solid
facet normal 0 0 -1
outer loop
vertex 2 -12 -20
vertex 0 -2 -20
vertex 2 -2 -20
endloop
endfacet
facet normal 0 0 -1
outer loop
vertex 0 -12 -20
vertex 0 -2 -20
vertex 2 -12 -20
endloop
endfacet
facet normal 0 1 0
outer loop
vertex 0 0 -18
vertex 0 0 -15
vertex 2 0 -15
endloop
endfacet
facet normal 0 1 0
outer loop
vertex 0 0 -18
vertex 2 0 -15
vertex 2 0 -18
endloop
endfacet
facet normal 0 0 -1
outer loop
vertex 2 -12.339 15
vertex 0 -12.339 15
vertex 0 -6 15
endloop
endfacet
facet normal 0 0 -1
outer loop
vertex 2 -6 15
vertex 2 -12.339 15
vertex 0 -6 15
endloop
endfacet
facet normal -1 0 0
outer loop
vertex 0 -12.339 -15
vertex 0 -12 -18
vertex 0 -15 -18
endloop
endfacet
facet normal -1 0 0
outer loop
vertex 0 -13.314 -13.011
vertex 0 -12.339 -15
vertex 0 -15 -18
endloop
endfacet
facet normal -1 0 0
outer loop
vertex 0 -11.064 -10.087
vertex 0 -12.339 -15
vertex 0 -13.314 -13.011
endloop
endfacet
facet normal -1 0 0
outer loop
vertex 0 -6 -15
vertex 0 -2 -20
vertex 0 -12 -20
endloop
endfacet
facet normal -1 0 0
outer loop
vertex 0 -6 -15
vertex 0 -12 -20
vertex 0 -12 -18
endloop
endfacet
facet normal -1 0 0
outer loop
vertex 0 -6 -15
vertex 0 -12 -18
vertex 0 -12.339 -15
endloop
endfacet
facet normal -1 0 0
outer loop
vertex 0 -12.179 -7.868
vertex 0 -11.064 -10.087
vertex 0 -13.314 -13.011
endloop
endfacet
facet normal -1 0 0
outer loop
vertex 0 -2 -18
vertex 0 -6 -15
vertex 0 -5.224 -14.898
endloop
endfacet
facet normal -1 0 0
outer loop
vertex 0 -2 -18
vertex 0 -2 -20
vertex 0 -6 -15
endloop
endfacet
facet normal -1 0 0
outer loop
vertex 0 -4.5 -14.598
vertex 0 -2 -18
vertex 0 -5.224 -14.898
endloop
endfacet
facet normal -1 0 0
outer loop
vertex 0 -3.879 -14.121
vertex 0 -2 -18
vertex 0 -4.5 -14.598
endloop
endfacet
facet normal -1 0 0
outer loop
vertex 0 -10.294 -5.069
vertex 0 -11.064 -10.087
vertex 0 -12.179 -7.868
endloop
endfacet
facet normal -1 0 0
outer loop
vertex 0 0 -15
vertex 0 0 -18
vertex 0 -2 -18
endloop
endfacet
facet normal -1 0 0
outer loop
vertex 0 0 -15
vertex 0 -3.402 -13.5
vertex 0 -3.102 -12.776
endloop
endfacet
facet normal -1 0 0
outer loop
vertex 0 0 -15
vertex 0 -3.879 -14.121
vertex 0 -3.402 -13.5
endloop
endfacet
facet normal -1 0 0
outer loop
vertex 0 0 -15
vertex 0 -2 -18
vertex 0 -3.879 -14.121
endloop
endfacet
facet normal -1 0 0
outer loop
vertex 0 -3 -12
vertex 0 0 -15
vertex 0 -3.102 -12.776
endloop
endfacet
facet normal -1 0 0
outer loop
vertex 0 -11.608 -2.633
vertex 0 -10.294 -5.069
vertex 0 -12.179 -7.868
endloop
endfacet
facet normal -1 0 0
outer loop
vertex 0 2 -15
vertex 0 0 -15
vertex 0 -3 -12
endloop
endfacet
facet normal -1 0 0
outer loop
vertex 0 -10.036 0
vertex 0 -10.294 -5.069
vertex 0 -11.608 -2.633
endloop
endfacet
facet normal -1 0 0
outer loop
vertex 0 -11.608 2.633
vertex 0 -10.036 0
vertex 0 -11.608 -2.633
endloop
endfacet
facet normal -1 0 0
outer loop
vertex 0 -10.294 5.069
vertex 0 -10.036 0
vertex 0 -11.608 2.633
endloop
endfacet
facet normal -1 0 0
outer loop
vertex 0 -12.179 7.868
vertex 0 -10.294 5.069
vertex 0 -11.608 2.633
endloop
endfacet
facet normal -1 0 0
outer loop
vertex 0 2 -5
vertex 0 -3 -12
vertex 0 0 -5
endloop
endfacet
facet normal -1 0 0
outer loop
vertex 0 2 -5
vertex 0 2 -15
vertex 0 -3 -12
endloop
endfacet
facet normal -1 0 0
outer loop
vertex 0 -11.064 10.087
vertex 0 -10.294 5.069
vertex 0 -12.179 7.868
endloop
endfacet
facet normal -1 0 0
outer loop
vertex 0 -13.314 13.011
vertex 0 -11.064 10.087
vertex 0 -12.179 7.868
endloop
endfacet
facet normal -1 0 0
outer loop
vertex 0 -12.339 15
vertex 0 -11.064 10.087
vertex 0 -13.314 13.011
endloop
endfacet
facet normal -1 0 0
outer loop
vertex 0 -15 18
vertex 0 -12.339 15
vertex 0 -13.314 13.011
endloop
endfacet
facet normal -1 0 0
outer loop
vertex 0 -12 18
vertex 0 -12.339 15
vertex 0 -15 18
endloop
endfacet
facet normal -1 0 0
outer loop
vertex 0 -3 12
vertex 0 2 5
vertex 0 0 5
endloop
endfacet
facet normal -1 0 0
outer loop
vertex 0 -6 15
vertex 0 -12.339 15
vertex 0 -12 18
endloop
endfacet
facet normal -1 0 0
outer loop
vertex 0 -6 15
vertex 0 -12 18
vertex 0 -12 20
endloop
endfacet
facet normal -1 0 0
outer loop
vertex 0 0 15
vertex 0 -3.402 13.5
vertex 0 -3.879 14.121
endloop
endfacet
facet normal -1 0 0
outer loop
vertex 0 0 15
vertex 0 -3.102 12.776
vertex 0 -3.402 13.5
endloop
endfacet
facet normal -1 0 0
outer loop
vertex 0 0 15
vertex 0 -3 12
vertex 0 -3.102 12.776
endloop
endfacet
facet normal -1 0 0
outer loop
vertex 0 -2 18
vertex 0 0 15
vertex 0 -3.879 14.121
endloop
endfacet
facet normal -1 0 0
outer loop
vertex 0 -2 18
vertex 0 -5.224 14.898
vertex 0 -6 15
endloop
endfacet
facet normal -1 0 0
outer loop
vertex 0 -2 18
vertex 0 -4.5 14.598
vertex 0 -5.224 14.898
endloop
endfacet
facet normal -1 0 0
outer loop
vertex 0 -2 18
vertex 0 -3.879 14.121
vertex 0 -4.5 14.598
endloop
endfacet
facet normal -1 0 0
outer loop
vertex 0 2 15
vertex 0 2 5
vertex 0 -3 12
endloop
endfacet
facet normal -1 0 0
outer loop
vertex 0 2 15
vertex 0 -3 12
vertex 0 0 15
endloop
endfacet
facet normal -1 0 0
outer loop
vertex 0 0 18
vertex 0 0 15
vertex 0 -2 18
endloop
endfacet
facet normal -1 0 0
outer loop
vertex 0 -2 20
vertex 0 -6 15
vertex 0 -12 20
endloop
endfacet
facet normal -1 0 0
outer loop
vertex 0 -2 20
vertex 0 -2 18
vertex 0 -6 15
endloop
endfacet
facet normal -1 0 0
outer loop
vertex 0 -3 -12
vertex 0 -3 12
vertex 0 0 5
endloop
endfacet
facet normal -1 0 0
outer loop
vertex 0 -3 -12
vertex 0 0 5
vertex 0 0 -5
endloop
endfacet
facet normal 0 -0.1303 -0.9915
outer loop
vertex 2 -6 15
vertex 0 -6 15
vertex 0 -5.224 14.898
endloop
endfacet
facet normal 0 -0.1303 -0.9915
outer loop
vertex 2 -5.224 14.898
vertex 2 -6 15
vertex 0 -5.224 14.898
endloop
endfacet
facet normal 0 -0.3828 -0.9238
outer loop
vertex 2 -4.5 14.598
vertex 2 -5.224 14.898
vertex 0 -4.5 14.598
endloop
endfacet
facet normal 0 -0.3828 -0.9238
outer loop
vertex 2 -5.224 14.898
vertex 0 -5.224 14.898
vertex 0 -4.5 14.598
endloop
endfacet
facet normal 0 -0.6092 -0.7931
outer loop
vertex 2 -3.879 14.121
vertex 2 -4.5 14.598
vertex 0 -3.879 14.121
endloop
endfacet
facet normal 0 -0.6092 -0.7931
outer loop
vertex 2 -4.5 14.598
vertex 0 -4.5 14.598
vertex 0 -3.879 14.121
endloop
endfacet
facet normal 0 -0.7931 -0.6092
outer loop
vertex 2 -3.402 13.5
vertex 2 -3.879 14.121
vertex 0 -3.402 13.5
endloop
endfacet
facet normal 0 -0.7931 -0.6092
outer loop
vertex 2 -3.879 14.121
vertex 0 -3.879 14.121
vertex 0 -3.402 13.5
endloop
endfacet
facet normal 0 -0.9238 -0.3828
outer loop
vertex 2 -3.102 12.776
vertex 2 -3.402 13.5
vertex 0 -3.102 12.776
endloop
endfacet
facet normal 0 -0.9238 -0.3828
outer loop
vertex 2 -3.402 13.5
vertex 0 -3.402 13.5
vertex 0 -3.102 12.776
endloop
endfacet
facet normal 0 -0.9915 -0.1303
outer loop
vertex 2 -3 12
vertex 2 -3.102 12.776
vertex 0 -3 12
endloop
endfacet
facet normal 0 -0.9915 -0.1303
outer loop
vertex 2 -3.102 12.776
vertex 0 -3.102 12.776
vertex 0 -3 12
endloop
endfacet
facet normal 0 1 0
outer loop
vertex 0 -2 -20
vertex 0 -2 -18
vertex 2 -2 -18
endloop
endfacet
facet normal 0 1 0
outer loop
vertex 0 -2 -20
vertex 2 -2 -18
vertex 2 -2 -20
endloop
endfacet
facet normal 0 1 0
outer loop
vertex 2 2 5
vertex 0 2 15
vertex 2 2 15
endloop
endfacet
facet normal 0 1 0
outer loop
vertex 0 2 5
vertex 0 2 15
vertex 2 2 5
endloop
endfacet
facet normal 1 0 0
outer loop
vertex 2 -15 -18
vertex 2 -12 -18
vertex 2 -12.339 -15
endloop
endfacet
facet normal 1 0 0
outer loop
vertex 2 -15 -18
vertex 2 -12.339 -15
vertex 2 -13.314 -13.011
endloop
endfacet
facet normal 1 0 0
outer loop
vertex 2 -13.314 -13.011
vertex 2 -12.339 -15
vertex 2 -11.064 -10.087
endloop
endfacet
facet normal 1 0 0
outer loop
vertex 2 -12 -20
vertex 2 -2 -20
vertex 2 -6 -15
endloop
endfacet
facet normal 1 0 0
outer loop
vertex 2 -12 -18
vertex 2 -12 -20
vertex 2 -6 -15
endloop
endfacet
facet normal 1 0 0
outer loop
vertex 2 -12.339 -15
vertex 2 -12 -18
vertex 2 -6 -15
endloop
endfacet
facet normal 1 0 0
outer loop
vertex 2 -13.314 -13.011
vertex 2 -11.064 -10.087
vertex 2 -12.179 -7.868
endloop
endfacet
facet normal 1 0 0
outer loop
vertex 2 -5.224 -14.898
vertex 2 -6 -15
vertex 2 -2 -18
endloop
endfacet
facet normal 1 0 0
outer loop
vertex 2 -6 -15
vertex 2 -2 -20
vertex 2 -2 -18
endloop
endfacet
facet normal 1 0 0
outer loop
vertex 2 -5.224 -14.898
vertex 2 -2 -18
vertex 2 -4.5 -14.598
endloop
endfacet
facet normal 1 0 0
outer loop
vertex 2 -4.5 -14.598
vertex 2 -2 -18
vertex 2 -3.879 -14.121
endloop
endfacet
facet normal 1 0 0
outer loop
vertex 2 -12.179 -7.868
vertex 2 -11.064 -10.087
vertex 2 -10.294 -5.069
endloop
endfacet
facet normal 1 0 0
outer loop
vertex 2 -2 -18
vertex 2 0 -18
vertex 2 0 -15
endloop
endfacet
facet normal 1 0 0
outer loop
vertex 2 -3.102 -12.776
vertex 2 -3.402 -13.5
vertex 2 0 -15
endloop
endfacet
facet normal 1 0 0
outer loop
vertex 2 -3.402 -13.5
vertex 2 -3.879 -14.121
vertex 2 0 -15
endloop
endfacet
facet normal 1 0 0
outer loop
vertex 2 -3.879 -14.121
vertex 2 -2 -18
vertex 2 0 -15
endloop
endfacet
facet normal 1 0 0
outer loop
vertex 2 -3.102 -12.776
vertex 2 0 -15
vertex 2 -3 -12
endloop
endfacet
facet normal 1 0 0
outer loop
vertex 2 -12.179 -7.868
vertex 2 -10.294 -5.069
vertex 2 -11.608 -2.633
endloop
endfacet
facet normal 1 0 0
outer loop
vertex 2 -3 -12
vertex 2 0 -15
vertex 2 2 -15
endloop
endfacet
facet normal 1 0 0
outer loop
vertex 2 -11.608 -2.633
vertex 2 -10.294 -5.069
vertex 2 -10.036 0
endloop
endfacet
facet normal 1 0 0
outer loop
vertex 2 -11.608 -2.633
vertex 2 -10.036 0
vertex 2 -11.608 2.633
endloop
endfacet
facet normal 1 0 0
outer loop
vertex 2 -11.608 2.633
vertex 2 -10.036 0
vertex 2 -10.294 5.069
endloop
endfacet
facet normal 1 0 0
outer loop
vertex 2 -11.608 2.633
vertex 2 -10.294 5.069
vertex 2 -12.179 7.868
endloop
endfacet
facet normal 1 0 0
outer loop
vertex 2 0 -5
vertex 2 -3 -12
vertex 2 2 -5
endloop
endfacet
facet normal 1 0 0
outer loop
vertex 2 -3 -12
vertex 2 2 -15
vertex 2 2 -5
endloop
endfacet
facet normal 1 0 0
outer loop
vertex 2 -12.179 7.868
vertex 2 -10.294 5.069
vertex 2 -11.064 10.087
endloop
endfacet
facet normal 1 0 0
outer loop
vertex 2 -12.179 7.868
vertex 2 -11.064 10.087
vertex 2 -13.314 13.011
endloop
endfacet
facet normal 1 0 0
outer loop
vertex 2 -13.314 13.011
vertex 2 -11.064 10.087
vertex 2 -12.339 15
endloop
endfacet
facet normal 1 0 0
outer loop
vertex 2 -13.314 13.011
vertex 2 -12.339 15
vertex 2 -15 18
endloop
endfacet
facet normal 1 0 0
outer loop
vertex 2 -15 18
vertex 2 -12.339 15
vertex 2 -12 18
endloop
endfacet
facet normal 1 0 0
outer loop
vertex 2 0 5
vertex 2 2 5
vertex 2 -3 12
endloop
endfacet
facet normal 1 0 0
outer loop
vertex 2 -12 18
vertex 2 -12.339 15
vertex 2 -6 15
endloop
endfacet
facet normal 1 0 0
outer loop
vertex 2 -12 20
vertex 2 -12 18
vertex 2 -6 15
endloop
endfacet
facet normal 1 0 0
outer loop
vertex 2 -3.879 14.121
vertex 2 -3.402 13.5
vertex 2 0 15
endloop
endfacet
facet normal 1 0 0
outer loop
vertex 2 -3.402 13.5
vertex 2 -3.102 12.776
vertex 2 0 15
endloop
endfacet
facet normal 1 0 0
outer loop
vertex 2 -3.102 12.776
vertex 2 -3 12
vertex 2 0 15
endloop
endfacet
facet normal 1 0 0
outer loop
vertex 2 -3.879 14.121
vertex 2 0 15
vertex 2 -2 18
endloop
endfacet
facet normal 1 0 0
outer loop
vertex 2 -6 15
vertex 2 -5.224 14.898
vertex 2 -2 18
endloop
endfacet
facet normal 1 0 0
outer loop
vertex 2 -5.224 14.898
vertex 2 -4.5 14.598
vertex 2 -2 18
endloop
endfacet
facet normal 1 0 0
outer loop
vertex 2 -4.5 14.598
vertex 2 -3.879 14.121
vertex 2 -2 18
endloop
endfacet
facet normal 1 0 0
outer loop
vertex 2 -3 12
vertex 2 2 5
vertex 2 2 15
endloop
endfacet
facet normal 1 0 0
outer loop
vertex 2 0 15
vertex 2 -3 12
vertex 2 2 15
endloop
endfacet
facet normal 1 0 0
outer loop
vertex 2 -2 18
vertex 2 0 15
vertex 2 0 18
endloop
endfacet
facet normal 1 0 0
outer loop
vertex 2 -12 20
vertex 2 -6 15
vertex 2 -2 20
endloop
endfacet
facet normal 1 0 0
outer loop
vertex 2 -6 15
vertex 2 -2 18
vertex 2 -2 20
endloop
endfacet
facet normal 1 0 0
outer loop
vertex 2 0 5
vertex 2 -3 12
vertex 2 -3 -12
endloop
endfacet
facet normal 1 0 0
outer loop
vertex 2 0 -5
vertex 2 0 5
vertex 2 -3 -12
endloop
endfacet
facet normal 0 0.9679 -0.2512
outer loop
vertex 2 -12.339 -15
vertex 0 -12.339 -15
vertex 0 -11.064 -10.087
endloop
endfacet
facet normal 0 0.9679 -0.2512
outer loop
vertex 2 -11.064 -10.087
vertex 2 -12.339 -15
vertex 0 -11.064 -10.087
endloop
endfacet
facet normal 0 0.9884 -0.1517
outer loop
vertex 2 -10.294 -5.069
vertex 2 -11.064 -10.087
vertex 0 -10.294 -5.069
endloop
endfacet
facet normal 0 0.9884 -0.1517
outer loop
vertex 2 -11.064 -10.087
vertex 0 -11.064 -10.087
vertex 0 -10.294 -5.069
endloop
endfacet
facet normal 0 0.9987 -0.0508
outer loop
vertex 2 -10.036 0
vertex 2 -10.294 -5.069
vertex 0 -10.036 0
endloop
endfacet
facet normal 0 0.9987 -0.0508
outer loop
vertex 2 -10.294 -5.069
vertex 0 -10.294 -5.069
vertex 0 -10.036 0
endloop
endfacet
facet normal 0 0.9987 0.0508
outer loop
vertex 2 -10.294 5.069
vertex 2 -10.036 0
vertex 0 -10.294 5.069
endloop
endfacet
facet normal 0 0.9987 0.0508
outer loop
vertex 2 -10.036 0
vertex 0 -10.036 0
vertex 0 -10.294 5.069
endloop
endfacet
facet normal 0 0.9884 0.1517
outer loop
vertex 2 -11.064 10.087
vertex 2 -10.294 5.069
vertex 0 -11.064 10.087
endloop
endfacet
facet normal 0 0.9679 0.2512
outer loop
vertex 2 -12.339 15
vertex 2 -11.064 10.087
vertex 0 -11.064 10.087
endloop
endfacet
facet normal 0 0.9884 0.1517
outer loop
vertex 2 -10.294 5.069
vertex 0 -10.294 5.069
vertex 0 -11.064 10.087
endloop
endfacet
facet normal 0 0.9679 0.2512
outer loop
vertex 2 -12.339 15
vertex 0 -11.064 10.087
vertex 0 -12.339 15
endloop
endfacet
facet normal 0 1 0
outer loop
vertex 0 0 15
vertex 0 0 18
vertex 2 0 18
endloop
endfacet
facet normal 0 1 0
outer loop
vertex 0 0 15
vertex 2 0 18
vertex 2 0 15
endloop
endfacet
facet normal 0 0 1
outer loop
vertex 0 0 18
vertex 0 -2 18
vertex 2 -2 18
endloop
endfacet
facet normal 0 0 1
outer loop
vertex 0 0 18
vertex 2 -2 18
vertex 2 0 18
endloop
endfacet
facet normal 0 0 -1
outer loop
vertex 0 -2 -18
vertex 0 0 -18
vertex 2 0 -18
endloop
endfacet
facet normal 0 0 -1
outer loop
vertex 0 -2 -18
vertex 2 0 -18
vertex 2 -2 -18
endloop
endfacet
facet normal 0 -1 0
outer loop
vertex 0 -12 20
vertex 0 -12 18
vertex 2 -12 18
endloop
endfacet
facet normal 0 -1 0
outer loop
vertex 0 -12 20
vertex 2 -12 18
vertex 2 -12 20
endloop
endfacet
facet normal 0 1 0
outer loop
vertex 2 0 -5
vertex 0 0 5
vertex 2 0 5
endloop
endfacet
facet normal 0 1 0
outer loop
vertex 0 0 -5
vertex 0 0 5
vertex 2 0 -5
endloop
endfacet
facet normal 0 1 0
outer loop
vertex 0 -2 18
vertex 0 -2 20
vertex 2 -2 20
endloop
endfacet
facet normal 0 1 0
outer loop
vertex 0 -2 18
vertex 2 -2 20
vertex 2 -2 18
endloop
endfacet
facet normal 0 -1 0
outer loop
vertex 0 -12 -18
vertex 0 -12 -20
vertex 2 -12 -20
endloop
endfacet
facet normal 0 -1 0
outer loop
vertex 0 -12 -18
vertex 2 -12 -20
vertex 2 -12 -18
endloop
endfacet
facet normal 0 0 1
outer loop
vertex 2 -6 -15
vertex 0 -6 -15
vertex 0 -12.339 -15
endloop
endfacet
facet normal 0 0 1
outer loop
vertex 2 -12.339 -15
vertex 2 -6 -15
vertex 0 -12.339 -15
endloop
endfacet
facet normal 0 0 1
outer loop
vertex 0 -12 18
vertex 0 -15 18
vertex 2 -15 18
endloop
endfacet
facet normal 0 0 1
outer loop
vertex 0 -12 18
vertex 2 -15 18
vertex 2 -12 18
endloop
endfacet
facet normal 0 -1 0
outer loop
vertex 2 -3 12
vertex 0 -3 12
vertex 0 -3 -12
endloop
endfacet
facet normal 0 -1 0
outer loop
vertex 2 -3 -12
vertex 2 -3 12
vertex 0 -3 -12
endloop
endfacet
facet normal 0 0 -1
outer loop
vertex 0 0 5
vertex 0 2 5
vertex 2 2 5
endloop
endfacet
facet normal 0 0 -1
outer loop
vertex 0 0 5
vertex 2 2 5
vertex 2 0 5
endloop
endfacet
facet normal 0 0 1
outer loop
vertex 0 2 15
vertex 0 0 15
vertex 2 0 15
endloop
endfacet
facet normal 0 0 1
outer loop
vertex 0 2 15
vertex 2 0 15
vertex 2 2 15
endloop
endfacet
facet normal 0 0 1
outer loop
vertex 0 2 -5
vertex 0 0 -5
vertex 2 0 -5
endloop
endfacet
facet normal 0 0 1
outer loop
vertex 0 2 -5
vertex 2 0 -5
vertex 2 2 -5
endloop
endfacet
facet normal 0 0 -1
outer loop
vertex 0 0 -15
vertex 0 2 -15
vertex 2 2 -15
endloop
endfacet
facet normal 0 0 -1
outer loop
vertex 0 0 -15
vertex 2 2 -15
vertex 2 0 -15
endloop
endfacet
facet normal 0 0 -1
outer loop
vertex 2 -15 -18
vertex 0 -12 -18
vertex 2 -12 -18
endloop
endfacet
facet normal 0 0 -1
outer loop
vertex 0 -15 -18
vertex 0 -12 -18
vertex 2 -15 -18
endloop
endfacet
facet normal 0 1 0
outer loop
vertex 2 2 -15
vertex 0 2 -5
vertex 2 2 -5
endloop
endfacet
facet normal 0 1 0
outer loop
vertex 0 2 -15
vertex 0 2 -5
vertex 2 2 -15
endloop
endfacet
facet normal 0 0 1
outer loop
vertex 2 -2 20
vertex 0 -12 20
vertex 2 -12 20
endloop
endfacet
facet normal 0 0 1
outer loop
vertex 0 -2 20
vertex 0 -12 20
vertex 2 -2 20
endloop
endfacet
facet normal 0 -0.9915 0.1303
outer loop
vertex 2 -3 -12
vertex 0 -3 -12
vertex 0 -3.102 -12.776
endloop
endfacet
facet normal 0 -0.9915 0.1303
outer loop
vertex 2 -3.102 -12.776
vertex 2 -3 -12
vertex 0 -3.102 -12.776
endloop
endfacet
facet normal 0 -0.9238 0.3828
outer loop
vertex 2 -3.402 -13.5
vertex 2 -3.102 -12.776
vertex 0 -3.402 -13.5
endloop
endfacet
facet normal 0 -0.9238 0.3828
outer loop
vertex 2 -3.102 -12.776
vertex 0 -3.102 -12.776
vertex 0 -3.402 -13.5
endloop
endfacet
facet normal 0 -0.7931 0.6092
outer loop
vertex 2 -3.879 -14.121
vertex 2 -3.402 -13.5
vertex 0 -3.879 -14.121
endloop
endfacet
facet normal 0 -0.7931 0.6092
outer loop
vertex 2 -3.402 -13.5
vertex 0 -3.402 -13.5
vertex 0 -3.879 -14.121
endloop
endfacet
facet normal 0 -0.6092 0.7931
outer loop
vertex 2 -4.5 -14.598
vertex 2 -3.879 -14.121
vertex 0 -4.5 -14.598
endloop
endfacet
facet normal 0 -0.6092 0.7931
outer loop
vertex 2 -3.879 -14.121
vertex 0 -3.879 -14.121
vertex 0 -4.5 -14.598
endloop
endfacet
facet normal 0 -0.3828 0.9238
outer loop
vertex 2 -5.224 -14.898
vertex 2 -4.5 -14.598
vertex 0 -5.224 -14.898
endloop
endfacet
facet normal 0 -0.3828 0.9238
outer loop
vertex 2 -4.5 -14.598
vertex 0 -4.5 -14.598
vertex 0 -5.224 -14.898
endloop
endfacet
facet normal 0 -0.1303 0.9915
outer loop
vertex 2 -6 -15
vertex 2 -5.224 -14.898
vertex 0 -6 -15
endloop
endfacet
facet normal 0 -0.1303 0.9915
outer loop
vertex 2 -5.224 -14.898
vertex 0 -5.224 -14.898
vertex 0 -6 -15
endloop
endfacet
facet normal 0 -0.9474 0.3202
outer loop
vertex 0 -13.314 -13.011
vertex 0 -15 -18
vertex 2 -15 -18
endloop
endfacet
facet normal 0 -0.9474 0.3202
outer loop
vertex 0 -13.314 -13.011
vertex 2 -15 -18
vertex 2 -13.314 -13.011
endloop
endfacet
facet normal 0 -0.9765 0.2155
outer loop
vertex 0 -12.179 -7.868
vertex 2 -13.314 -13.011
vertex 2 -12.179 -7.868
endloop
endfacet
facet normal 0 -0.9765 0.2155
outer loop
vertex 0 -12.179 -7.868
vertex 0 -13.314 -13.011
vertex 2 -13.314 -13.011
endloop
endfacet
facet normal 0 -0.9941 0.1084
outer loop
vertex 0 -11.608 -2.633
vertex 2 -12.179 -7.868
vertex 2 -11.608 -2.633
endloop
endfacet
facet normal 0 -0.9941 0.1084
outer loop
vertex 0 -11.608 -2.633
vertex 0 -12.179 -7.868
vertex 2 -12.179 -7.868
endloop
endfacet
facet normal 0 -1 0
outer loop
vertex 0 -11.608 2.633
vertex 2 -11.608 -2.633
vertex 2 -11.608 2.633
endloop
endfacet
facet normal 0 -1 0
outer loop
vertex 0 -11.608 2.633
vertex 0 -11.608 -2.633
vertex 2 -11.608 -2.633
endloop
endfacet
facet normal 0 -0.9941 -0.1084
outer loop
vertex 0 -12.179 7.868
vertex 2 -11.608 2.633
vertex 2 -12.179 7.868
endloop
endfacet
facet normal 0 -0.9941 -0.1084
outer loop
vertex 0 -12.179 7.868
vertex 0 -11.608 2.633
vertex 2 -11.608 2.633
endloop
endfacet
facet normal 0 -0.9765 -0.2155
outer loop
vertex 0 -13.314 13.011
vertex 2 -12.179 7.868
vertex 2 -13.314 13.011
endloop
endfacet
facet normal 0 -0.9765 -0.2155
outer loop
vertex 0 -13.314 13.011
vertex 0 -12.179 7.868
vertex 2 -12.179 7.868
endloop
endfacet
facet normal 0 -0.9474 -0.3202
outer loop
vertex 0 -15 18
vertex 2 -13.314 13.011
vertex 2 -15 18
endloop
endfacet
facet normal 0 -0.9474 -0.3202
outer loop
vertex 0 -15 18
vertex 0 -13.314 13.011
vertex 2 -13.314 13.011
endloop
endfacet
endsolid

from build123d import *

# Parameters (mm, degrees)
BOSS_EXTRUDE1_DEPTH = 2


with BuildPart() as part:
    # Sketch1 → Boss-Extrude1 (new body)
    with BuildSketch(Plane(origin=(0, 0, 0), x_dir=(0, 0, -1), z_dir=(1, 0, 0))):
        with BuildLine():
            Line((-18, 0), (-15, 0))
            Line((-15, 0), (-15, 2))
            Line((-15, 2), (-5, 2))
            Line((-5, 2), (-5, 0))
            Line((-5, 0), (5, 0))
            Line((5, 0), (5, 2))
            Line((5, 2), (15, 2))
            Line((15, 2), (15, 0))
            Line((15, 0), (18, 0))
            Line((18, 0), (18, -2))
            Line((18, -2), (20, -2))
            Line((20, -2), (20, -12))
            Line((20, -12), (18, -12))
            Line((18, -12), (18, -15))
            ThreePointArc((18, -15), (0, -11.536096634), (-18, -15))
            Line((-18, -15), (-18, -12))
            Line((-18, -12), (-20, -12))
            Line((-20, -12), (-20, -2))
            Line((-20, -2), (-18, -2))
            Line((-18, -2), (-18, 0))
        make_face()
        with BuildLine():
            Line((-15, -12.339136563), (-15, -6))
            ThreePointArc((-15, -6), (-14.121320344, -3.878679656), (-12, -3))
            Line((-12, -3), (12, -3))
            ThreePointArc((12, -3), (14.121320344, -3.878679656), (15, -6))
            Line((15, -6), (15, -12.339136563))
            ThreePointArc((15, -12.339136563), (0, -10.036096634), (-15, -12.339136563))
        make_face(mode=Mode.SUBTRACT)
    extrude(amount=BOSS_EXTRUDE1_DEPTH)


solid = part.part
